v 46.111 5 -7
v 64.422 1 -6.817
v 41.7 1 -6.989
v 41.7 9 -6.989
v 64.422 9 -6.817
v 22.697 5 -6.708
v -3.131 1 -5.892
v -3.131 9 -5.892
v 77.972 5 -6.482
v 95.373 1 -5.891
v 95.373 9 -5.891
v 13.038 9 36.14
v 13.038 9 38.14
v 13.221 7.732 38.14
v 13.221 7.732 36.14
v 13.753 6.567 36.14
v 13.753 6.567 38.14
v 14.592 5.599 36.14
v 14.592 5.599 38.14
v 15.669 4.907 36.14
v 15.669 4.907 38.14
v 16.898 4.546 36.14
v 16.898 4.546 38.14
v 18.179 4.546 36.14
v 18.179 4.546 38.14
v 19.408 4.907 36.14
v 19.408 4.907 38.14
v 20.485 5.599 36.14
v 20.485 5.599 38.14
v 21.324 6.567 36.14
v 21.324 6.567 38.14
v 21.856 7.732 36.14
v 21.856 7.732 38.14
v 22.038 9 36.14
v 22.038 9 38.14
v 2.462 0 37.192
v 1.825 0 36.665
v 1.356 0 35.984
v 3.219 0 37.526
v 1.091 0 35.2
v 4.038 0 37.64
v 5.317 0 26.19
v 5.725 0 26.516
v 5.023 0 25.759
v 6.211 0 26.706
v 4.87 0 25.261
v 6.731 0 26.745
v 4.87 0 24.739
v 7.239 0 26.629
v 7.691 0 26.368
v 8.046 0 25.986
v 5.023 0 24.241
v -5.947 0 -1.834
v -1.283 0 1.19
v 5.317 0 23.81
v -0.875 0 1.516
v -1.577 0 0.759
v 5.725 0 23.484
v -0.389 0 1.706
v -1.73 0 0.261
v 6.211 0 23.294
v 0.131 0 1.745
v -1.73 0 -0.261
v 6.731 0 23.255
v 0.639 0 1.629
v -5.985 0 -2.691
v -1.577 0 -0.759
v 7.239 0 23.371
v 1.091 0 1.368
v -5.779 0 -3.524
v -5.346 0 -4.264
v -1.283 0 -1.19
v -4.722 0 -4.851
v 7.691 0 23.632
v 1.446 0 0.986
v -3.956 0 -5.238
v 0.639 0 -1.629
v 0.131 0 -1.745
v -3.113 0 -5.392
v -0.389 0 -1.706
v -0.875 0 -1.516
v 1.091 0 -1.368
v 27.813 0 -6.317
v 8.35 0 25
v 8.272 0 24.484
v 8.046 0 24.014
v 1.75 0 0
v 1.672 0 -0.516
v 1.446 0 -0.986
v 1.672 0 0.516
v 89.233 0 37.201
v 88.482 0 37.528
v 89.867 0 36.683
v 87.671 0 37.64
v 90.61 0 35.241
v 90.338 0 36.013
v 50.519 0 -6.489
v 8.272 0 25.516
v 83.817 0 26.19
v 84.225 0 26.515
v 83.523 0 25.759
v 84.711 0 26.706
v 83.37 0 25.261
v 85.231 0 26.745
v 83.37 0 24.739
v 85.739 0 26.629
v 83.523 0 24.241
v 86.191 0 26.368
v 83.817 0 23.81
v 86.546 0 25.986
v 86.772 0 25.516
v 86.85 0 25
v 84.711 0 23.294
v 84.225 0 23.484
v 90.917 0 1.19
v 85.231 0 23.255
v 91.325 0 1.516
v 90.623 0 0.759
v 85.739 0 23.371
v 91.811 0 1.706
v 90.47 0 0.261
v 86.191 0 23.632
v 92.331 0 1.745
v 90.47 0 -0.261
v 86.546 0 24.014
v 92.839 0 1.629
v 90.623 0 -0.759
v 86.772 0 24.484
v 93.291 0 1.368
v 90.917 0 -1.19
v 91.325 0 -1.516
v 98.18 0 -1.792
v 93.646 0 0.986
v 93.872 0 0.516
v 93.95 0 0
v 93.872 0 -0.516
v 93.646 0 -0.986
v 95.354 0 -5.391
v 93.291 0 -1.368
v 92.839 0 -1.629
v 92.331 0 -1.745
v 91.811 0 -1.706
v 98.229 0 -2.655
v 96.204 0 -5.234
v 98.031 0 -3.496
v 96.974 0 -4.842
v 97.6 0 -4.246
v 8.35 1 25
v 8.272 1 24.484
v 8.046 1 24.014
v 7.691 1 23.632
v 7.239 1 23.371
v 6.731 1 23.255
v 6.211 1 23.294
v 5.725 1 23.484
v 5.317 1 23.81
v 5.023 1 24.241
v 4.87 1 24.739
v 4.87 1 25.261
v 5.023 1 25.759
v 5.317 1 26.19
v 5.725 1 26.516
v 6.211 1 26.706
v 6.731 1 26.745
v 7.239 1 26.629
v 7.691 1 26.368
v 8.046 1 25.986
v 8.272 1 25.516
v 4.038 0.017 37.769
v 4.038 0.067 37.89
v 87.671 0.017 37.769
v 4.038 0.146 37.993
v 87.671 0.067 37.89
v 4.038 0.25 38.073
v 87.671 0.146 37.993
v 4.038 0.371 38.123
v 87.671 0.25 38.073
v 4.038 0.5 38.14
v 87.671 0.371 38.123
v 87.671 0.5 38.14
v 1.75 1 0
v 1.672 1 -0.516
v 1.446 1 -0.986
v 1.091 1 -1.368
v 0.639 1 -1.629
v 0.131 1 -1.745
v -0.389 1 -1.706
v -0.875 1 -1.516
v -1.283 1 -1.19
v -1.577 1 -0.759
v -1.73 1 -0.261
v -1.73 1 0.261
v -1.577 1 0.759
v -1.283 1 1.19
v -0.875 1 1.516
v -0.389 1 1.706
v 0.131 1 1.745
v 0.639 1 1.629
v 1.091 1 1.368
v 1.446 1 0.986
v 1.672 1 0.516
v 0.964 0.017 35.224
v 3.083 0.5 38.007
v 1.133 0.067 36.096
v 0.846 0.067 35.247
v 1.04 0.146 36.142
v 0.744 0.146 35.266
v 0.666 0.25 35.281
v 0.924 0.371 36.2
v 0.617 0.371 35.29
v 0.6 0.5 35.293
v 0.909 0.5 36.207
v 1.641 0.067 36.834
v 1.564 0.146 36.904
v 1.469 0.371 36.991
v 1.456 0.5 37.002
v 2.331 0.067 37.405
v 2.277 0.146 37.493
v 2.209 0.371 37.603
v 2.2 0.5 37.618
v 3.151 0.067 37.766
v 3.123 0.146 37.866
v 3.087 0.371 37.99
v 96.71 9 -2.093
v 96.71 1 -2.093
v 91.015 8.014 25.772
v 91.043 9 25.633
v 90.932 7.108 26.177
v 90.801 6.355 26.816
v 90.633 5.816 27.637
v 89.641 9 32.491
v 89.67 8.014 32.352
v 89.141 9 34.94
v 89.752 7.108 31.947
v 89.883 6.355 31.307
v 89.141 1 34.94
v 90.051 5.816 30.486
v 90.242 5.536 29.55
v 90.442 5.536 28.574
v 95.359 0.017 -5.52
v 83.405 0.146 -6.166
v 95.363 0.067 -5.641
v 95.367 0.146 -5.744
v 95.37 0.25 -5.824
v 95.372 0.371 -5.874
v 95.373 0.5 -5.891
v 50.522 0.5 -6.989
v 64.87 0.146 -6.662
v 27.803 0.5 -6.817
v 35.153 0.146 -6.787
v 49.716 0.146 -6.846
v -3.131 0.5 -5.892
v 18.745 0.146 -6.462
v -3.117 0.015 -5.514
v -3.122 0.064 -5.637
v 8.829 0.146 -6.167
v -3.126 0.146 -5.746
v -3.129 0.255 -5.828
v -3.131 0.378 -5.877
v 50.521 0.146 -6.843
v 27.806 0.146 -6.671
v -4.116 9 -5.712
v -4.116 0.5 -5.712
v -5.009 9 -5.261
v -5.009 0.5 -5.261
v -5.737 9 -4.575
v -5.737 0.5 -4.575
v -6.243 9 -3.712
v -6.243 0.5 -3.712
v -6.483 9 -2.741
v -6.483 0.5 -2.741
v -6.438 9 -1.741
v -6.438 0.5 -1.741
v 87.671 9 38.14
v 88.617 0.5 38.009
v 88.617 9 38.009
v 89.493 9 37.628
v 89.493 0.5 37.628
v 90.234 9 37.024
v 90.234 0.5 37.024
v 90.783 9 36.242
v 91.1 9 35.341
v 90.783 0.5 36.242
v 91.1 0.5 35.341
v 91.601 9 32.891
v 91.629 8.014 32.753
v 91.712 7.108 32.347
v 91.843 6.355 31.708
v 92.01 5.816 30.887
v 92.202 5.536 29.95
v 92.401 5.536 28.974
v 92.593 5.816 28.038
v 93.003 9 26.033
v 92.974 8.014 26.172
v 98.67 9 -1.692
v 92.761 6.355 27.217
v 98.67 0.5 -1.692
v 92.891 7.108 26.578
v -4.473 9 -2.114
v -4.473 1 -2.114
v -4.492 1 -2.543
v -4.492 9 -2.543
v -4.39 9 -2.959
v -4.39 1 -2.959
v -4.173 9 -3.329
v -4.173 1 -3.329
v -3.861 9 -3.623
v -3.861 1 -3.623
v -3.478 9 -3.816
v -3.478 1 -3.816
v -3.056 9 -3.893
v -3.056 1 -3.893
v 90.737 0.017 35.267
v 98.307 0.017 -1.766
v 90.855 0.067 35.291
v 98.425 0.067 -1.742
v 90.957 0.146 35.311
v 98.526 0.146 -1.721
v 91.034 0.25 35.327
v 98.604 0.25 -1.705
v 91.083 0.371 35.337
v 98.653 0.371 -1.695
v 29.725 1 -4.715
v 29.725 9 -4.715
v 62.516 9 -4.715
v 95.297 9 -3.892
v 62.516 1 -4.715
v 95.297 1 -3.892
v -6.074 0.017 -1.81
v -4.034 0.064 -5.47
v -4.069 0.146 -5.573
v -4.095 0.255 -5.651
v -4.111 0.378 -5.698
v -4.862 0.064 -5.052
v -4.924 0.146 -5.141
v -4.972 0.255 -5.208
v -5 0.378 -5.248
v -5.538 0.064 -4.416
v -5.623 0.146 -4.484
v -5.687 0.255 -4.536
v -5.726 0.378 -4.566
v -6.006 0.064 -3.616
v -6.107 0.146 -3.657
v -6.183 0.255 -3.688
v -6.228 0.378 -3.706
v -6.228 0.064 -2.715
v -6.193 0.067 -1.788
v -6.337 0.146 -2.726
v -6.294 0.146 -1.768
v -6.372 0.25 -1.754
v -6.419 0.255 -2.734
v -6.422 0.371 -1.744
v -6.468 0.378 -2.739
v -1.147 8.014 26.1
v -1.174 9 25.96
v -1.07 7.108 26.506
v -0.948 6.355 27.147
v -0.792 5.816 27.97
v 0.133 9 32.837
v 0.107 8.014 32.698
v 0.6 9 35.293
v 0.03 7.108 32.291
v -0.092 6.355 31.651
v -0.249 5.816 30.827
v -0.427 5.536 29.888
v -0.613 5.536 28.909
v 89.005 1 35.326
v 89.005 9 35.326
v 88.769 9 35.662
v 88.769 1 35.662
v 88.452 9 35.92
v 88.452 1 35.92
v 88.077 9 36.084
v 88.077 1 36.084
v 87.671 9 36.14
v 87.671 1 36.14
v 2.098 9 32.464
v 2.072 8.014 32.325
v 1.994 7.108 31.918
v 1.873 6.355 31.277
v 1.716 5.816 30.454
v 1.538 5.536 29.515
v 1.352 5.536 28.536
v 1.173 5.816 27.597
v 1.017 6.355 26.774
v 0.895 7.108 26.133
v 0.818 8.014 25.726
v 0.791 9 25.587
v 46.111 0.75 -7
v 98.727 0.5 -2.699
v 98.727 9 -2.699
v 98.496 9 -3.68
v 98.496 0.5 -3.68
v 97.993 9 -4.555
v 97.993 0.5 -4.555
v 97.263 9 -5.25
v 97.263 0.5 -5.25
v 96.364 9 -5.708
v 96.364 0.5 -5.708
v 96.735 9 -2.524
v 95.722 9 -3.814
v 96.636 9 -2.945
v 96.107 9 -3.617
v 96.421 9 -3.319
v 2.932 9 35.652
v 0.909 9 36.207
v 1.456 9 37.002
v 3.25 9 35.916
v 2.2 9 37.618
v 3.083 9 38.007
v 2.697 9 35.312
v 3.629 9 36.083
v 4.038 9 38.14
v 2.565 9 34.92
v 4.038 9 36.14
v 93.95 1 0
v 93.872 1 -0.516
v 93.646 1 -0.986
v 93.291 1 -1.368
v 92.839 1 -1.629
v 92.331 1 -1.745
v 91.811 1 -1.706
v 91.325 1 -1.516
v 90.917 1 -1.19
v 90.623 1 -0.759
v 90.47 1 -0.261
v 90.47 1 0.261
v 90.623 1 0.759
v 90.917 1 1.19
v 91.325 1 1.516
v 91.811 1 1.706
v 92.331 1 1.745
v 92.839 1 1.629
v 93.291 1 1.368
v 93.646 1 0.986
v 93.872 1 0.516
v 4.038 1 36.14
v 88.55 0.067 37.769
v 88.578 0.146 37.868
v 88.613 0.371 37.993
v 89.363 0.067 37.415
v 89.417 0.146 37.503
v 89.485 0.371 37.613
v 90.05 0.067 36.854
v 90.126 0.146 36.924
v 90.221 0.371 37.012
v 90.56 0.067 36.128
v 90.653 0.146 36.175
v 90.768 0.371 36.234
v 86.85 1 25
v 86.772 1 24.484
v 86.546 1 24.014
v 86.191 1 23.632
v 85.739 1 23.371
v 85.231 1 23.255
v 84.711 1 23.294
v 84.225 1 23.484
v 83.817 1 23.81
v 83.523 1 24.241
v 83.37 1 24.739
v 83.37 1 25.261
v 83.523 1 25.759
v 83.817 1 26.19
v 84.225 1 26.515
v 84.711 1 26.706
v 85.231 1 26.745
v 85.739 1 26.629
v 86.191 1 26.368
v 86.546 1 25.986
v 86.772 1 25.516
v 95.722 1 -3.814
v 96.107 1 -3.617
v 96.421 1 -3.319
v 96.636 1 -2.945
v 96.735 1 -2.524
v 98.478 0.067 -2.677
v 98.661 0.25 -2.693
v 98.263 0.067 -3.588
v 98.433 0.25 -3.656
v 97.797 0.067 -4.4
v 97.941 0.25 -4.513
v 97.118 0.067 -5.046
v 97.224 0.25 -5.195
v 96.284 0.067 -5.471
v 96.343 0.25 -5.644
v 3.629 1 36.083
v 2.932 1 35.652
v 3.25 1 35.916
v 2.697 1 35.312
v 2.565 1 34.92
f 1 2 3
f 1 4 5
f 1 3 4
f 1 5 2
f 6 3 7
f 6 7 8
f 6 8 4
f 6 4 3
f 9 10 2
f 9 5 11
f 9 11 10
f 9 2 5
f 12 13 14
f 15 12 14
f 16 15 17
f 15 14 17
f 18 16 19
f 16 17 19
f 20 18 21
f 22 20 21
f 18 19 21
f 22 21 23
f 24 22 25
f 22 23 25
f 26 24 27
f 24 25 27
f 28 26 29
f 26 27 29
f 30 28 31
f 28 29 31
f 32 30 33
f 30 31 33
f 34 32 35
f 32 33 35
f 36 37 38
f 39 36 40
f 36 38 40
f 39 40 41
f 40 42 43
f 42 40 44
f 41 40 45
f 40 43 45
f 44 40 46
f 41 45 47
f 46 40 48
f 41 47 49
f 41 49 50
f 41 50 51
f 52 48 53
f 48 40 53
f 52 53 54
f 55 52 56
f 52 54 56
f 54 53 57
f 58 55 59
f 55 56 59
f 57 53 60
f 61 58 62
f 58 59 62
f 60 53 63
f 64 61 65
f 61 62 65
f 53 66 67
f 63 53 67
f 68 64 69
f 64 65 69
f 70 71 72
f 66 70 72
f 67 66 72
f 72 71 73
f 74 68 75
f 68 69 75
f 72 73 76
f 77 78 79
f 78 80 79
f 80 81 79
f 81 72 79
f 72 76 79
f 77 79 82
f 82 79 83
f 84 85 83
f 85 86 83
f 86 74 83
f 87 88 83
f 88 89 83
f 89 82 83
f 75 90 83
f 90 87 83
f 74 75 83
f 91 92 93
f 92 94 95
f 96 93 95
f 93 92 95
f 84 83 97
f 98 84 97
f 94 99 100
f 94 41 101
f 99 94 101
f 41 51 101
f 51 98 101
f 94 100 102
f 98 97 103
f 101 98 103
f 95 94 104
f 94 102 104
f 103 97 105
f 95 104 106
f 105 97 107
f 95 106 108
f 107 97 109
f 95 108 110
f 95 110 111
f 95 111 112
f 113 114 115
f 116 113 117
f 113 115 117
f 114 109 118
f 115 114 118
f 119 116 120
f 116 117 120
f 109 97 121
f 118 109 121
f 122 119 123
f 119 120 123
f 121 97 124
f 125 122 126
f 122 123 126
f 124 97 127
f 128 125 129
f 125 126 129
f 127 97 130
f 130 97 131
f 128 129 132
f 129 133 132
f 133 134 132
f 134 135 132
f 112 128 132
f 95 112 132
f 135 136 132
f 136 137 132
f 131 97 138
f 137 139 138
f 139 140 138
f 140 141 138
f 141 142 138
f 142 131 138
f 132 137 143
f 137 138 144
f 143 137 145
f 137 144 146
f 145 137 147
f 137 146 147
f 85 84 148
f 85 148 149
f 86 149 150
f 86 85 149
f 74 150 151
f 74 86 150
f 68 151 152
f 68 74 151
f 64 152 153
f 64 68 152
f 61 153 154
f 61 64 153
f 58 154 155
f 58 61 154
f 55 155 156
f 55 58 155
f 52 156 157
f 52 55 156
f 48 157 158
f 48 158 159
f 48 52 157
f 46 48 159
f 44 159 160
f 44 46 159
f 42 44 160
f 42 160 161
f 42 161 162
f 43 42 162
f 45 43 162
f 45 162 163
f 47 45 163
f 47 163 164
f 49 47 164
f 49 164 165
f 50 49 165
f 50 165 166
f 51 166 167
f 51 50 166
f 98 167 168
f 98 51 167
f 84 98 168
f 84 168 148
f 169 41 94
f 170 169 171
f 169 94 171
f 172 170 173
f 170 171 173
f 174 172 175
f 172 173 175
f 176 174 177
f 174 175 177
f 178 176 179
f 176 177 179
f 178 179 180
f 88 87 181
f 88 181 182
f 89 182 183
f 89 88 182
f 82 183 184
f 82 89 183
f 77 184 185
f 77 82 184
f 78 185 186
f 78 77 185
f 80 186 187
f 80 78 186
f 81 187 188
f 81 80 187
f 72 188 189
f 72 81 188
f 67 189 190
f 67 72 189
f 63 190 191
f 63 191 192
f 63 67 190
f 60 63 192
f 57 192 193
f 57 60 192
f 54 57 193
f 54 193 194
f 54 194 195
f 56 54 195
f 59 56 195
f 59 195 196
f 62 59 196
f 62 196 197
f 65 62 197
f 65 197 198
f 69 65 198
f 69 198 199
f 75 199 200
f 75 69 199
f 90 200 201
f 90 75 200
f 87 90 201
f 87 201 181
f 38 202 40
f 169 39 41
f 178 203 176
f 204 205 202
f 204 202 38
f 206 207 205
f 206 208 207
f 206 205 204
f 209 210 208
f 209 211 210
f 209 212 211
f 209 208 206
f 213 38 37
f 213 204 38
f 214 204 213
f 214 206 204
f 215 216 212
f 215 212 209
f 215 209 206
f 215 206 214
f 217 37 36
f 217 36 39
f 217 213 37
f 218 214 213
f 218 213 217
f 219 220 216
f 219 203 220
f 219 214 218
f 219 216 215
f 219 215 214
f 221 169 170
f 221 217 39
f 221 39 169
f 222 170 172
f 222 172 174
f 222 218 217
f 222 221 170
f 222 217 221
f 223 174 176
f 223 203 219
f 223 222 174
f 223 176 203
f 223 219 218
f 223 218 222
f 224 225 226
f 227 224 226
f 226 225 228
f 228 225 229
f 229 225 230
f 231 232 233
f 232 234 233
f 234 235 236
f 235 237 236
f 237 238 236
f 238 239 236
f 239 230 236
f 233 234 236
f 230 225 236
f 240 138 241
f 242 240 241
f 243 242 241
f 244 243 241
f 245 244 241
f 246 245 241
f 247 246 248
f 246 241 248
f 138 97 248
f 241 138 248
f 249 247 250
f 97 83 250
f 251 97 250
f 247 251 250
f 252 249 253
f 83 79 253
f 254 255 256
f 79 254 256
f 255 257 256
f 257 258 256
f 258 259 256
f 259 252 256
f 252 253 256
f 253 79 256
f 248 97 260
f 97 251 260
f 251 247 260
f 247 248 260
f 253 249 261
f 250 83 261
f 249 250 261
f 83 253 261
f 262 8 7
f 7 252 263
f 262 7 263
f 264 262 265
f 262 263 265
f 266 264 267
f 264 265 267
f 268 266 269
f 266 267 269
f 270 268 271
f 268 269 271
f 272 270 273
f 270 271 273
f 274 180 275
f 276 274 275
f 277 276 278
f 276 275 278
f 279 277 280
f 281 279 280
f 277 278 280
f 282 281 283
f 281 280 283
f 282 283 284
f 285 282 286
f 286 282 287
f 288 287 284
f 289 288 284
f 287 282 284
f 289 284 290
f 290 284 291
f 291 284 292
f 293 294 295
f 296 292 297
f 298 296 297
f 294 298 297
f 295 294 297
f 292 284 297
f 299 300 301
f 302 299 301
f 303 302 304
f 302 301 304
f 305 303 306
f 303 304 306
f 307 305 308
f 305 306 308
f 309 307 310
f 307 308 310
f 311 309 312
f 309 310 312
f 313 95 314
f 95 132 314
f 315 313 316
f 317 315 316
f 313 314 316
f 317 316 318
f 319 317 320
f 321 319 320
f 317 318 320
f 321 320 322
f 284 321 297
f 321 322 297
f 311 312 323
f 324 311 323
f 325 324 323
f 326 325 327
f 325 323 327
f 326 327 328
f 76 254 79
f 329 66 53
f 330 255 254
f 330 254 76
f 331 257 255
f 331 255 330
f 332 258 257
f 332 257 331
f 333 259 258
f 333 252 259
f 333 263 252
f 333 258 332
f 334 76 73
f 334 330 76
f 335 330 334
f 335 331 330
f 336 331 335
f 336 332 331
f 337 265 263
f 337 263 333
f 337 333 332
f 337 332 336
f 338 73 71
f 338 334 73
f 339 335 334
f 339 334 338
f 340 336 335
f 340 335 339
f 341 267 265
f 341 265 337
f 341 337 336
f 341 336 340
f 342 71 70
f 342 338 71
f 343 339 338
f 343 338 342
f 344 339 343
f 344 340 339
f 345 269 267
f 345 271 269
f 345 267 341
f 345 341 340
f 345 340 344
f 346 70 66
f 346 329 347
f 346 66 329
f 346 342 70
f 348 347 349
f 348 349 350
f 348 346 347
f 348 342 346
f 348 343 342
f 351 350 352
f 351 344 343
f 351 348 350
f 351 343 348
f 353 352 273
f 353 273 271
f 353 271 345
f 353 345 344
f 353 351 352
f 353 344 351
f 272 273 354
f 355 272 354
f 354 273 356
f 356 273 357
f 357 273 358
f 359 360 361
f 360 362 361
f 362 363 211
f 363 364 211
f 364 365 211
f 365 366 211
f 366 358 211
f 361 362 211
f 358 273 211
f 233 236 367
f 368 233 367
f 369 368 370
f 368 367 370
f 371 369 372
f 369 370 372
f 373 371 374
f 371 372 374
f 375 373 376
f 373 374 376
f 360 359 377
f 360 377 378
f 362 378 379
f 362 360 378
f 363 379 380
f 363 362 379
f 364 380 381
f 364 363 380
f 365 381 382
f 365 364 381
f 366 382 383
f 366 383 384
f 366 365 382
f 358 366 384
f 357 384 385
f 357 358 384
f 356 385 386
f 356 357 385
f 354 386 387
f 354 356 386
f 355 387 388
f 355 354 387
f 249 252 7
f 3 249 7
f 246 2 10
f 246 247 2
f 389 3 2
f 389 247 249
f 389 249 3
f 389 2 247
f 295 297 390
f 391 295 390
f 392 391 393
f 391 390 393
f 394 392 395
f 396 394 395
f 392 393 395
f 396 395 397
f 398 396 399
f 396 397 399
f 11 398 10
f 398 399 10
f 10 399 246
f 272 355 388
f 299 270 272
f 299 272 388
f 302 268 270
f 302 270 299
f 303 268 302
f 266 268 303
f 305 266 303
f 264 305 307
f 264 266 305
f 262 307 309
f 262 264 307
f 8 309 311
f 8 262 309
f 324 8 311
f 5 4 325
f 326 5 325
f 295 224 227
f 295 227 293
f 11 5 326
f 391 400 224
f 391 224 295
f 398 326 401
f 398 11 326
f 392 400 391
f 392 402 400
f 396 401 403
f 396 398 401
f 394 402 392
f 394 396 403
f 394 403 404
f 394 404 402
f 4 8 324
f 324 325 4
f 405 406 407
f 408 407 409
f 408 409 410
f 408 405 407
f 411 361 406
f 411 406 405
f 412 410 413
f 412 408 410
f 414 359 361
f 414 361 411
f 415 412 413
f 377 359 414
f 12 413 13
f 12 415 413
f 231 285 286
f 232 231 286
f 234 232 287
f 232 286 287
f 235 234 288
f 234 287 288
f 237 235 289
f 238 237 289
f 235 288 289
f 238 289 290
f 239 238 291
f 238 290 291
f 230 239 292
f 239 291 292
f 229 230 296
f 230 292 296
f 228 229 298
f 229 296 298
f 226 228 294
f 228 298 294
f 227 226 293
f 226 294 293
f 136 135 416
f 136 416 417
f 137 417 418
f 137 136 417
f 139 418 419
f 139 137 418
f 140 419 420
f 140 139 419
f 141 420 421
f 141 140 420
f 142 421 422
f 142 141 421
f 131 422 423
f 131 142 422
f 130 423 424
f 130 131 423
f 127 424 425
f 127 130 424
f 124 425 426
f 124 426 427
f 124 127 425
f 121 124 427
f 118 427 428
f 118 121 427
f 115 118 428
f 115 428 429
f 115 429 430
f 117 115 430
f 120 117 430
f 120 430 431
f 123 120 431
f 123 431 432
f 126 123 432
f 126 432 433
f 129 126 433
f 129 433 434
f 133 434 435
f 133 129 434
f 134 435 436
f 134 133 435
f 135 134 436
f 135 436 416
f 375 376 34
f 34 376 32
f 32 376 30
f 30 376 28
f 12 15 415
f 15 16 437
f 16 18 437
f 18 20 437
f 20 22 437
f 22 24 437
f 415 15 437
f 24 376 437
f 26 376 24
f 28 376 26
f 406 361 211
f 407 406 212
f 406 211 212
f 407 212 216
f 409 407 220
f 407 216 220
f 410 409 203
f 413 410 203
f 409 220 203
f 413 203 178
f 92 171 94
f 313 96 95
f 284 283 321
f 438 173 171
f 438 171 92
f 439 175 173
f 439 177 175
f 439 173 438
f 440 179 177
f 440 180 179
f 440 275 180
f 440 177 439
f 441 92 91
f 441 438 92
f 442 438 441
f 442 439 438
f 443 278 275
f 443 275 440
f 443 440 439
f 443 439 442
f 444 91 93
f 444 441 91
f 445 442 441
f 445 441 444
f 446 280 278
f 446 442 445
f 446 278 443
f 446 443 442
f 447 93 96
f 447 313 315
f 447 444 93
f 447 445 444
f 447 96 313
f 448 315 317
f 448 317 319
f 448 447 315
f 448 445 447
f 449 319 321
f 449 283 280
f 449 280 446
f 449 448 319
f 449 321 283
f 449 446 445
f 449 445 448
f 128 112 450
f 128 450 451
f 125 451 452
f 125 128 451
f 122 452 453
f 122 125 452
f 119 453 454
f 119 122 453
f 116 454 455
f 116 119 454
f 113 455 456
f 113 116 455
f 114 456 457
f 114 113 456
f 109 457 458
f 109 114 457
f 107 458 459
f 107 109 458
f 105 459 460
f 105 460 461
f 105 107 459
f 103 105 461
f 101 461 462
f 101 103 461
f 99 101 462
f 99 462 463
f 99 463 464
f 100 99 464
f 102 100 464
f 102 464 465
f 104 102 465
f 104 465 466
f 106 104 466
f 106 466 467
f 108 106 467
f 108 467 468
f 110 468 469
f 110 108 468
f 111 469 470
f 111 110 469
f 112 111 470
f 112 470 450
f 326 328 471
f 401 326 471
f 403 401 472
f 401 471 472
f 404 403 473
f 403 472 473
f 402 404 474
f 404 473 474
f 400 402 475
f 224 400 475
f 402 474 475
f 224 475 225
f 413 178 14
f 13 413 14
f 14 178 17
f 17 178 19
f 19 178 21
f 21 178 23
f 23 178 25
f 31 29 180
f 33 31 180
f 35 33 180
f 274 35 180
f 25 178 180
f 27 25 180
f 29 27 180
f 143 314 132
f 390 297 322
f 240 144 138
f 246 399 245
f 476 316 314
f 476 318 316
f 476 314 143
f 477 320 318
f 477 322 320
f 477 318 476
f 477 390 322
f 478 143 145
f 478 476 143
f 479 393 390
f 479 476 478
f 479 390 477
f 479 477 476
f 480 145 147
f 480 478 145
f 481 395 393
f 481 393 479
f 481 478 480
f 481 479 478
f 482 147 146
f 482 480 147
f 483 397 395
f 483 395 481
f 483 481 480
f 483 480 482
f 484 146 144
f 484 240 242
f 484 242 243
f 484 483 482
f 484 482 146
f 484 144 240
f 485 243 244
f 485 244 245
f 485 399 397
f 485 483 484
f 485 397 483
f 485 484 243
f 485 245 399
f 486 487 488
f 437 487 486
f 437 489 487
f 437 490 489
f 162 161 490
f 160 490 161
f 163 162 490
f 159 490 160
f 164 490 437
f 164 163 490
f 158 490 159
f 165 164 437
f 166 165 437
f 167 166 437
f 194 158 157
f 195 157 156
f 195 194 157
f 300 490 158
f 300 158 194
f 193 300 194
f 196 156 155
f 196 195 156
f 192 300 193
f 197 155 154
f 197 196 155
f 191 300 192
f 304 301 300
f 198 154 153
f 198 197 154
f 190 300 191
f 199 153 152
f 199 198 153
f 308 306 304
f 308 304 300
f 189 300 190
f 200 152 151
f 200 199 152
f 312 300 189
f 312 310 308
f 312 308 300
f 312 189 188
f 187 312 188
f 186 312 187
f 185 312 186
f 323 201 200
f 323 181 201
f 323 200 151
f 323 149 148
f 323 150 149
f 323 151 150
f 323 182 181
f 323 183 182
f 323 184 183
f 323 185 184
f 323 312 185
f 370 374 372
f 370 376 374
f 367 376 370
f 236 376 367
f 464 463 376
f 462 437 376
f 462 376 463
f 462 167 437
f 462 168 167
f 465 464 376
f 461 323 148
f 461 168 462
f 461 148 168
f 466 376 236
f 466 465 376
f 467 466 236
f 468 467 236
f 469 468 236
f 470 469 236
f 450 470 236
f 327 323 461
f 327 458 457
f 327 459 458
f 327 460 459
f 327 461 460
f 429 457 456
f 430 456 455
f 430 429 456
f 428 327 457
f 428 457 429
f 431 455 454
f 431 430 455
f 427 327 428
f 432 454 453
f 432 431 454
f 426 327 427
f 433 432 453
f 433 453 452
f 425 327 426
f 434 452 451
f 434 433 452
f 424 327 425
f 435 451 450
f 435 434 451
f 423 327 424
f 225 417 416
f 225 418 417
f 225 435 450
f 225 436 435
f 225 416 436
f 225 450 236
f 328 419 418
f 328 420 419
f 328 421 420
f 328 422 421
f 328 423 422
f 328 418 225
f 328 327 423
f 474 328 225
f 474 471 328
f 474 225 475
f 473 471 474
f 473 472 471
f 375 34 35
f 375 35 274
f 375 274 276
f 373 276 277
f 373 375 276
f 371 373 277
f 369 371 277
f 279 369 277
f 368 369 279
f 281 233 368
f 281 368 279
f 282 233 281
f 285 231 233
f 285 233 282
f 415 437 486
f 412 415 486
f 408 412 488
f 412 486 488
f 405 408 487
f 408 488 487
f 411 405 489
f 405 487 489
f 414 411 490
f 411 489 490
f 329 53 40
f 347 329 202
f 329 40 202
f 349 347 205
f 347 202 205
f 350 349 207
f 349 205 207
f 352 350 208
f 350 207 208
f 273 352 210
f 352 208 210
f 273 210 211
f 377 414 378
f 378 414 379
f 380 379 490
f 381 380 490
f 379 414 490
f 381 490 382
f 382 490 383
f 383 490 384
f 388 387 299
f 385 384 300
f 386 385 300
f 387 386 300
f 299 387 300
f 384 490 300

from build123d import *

# Parameters (mm, degrees)
SKETCH1_R           = 1.75
BOSS_EXTRUDE1_DEPTH = 1
BOSS_EXTRUDE2_DEPTH = 9
CUT_EXTRUDE2_DEPTH  = 2
CUT_EXTRUDE3_DEPTH  = 7
FILLET1_R           = 0.5
CUT_EXTRUDE4_DEPTH  = 2


with BuildPart() as part:
    # Sketch1 → Boss-Extrude1 (new body)
    with BuildSketch(Plane(origin=(0, 0, 0), x_dir=(1, 0, 0), z_dir=(0, 1, 0))):
        with BuildLine():
            ThreePointArc((-3.131484069, 5.892071798), (-5.737365292, 4.575348005), (-6.438282309, 1.7410767))
            Line((-6.438282309, 1.7410767), (0.60003894, -35.29332564))
            ThreePointArc((0.60003894, -35.29332564), (1.806583814, -37.335883181), (4.03849413, -38.139853444))
            Line((4.03849413, -38.139853444), (87.670939293, -38.139853444))
            ThreePointArc((87.670939293, -38.139853444), (89.884160785, -37.35124619), (91.100032265, -35.340796659))
            Line((91.100032265, -35.340796659), (98.669943789, 1.692061139))
            ThreePointArc((98.669943789, 1.692061139), (97.993413035, 4.554809441), (95.372557333, 5.890525389))
            add(Edge.make_bspline(
                [(-3.131484069, 5.892071798), (46.109282616, 7.745637681), (95.372557333, 5.890525389)],
                knots=[0.096020277, 0.096020277, 0.096020277, 0.904206285, 0.904206285, 0.904206285], degree=2, weights=[1.148800657, 1.708499103, 1.148486764]))
        make_face()
        with Locations((6.60003894, -24.999988489)):
            Circle(SKETCH1_R, mode=Mode.SUBTRACT)
        with Locations((85.100032265, -24.999862922)):
            Circle(SKETCH1_R, mode=Mode.SUBTRACT)
        Circle(SKETCH1_R, mode=Mode.SUBTRACT)
        with Locations((92.2, 0)):
            Circle(SKETCH1_R, mode=Mode.SUBTRACT)
    extrude(amount=BOSS_EXTRUDE1_DEPTH)

    # Sketch1<5> → Boss-Extrude2 (add)
    with BuildSketch(Plane(origin=(0, 0, 0), x_dir=(1, 0, 0), z_dir=(0, 1, 0))):
        with BuildLine():
            ThreePointArc((-3.131484069, 5.892071798), (-5.737365292, 4.575348005), (-6.438282309, 1.7410767))
            Line((-6.438282309, 1.7410767), (0.60003894, -35.29332564))
            ThreePointArc((0.60003894, -35.29332564), (1.806583814, -37.335883181), (4.03849413, -38.139853444))
            Line((4.03849413, -38.139853444), (87.670939293, -38.139853444))
            ThreePointArc((87.670939293, -38.139853444), (89.884160785, -37.35124619), (91.100032265, -35.340796659))
            Line((91.100032265, -35.340796659), (98.669943789, 1.692061139))
            ThreePointArc((98.669943789, 1.692061139), (97.993413035, 4.554809441), (95.372557333, 5.890525389))
            add(Edge.make_bspline(
                [(-3.131484069, 5.892071798), (46.109282616, 7.745637681), (95.372557333, 5.890525389)],
                knots=[0.096020277, 0.096020277, 0.096020277, 0.904206285, 0.904206285, 0.904206285], degree=2, weights=[1.148800657, 1.708499103, 1.148486764]))
        make_face()
        with BuildLine():
            ThreePointArc((95.297296467, 3.89194194), (96.420520339, 3.319492248), (96.710462091, 2.092600119))
            Line((96.710462091, 2.092600119), (89.140550566, -34.940257679))
            ThreePointArc((89.140550566, -34.940257679), (88.619462789, -35.801878907), (87.670939293, -36.139853444))
            Line((87.670939293, -36.139853444), (4.03849413, -36.139853444))
            ThreePointArc((4.03849413, -36.139853444), (3.081961137, -35.79529476), (2.564870477, -34.919912956))
            Line((2.564870477, -34.919912956), (-4.473450772, 2.114489384))
            ThreePointArc((-4.473450772, 2.114489384), (-4.173057765, 3.329177086), (-3.056251526, 3.893487283))
            ThreePointArc((-3.056251526, 3.893487283), (46.120537007, 4.817927579), (95.297296467, 3.89194194))
        make_face(mode=Mode.SUBTRACT)
    extrude(amount=BOSS_EXTRUDE2_DEPTH)

    # Sketch2 → Cut-Extrude2 (cut)
    with BuildSketch(Plane(origin=(94.380499607, 0, 19.292381797), x_dir=(0.20026949000025768, 0, -0.9797408490897156), z_dir=(0.9797408490897156, 0, 0.20026949000025768))):
        with BuildLine():
            Line((-6.880265125, 9), (-13.880265125, 9))
            ThreePointArc((-13.880265125, 9), (-10.380265125, 5.5), (-6.880265125, 9))
        make_face()
    extrude(amount=-CUT_EXTRUDE2_DEPTH, mode=Mode.SUBTRACT)

    # Sketch3 → Cut-Extrude3 (cut)
    with BuildSketch(Plane.XY.offset(38.139853444)):
        with BuildLine():
            Line((22.03849413, 9), (13.03849413, 9))
            ThreePointArc((13.03849413, 9), (17.53849413, 4.5), (22.03849413, 9))
        make_face()
    extrude(amount=-CUT_EXTRUDE3_DEPTH, mode=Mode.SUBTRACT)

    # Fillet1
    fillet1_edges = [part.edges().sort_by_distance(p)[0] for p in [
        (45.854716711, 0, 38.139853444),
        (89.884160785, 0, 37.35124619),
        (94.884988027, 0, 16.82436776),
        (97.993413035, 0, -4.554809441),
        (46.120186786, 0, -7.000146325),
        (-5.737365292, 0, -4.575348005),
        (-2.919121684, 0, 16.77612447),
        (1.806583814, 0, 37.335883181),
    ]]
    fillet(fillet1_edges, radius=FILLET1_R)

    # Sketch4 → Cut-Extrude4 (cut)
    with BuildSketch(Plane(origin=(-5.89449461, 0, 1.12023805), x_dir=(0.1867063417029029, 0, 0.9824157683831826), z_dir=(-0.9824157683831826, 0, 0.1867063417029029))):
        with BuildLine():
            Line((25.284750703, 9), (32.284750703, 9))
            ThreePointArc((32.284750703, 9), (28.784750703, 5.5), (25.284750703, 9))
        make_face()
    extrude(amount=-CUT_EXTRUDE4_DEPTH, mode=Mode.SUBTRACT)


solid = part.part
